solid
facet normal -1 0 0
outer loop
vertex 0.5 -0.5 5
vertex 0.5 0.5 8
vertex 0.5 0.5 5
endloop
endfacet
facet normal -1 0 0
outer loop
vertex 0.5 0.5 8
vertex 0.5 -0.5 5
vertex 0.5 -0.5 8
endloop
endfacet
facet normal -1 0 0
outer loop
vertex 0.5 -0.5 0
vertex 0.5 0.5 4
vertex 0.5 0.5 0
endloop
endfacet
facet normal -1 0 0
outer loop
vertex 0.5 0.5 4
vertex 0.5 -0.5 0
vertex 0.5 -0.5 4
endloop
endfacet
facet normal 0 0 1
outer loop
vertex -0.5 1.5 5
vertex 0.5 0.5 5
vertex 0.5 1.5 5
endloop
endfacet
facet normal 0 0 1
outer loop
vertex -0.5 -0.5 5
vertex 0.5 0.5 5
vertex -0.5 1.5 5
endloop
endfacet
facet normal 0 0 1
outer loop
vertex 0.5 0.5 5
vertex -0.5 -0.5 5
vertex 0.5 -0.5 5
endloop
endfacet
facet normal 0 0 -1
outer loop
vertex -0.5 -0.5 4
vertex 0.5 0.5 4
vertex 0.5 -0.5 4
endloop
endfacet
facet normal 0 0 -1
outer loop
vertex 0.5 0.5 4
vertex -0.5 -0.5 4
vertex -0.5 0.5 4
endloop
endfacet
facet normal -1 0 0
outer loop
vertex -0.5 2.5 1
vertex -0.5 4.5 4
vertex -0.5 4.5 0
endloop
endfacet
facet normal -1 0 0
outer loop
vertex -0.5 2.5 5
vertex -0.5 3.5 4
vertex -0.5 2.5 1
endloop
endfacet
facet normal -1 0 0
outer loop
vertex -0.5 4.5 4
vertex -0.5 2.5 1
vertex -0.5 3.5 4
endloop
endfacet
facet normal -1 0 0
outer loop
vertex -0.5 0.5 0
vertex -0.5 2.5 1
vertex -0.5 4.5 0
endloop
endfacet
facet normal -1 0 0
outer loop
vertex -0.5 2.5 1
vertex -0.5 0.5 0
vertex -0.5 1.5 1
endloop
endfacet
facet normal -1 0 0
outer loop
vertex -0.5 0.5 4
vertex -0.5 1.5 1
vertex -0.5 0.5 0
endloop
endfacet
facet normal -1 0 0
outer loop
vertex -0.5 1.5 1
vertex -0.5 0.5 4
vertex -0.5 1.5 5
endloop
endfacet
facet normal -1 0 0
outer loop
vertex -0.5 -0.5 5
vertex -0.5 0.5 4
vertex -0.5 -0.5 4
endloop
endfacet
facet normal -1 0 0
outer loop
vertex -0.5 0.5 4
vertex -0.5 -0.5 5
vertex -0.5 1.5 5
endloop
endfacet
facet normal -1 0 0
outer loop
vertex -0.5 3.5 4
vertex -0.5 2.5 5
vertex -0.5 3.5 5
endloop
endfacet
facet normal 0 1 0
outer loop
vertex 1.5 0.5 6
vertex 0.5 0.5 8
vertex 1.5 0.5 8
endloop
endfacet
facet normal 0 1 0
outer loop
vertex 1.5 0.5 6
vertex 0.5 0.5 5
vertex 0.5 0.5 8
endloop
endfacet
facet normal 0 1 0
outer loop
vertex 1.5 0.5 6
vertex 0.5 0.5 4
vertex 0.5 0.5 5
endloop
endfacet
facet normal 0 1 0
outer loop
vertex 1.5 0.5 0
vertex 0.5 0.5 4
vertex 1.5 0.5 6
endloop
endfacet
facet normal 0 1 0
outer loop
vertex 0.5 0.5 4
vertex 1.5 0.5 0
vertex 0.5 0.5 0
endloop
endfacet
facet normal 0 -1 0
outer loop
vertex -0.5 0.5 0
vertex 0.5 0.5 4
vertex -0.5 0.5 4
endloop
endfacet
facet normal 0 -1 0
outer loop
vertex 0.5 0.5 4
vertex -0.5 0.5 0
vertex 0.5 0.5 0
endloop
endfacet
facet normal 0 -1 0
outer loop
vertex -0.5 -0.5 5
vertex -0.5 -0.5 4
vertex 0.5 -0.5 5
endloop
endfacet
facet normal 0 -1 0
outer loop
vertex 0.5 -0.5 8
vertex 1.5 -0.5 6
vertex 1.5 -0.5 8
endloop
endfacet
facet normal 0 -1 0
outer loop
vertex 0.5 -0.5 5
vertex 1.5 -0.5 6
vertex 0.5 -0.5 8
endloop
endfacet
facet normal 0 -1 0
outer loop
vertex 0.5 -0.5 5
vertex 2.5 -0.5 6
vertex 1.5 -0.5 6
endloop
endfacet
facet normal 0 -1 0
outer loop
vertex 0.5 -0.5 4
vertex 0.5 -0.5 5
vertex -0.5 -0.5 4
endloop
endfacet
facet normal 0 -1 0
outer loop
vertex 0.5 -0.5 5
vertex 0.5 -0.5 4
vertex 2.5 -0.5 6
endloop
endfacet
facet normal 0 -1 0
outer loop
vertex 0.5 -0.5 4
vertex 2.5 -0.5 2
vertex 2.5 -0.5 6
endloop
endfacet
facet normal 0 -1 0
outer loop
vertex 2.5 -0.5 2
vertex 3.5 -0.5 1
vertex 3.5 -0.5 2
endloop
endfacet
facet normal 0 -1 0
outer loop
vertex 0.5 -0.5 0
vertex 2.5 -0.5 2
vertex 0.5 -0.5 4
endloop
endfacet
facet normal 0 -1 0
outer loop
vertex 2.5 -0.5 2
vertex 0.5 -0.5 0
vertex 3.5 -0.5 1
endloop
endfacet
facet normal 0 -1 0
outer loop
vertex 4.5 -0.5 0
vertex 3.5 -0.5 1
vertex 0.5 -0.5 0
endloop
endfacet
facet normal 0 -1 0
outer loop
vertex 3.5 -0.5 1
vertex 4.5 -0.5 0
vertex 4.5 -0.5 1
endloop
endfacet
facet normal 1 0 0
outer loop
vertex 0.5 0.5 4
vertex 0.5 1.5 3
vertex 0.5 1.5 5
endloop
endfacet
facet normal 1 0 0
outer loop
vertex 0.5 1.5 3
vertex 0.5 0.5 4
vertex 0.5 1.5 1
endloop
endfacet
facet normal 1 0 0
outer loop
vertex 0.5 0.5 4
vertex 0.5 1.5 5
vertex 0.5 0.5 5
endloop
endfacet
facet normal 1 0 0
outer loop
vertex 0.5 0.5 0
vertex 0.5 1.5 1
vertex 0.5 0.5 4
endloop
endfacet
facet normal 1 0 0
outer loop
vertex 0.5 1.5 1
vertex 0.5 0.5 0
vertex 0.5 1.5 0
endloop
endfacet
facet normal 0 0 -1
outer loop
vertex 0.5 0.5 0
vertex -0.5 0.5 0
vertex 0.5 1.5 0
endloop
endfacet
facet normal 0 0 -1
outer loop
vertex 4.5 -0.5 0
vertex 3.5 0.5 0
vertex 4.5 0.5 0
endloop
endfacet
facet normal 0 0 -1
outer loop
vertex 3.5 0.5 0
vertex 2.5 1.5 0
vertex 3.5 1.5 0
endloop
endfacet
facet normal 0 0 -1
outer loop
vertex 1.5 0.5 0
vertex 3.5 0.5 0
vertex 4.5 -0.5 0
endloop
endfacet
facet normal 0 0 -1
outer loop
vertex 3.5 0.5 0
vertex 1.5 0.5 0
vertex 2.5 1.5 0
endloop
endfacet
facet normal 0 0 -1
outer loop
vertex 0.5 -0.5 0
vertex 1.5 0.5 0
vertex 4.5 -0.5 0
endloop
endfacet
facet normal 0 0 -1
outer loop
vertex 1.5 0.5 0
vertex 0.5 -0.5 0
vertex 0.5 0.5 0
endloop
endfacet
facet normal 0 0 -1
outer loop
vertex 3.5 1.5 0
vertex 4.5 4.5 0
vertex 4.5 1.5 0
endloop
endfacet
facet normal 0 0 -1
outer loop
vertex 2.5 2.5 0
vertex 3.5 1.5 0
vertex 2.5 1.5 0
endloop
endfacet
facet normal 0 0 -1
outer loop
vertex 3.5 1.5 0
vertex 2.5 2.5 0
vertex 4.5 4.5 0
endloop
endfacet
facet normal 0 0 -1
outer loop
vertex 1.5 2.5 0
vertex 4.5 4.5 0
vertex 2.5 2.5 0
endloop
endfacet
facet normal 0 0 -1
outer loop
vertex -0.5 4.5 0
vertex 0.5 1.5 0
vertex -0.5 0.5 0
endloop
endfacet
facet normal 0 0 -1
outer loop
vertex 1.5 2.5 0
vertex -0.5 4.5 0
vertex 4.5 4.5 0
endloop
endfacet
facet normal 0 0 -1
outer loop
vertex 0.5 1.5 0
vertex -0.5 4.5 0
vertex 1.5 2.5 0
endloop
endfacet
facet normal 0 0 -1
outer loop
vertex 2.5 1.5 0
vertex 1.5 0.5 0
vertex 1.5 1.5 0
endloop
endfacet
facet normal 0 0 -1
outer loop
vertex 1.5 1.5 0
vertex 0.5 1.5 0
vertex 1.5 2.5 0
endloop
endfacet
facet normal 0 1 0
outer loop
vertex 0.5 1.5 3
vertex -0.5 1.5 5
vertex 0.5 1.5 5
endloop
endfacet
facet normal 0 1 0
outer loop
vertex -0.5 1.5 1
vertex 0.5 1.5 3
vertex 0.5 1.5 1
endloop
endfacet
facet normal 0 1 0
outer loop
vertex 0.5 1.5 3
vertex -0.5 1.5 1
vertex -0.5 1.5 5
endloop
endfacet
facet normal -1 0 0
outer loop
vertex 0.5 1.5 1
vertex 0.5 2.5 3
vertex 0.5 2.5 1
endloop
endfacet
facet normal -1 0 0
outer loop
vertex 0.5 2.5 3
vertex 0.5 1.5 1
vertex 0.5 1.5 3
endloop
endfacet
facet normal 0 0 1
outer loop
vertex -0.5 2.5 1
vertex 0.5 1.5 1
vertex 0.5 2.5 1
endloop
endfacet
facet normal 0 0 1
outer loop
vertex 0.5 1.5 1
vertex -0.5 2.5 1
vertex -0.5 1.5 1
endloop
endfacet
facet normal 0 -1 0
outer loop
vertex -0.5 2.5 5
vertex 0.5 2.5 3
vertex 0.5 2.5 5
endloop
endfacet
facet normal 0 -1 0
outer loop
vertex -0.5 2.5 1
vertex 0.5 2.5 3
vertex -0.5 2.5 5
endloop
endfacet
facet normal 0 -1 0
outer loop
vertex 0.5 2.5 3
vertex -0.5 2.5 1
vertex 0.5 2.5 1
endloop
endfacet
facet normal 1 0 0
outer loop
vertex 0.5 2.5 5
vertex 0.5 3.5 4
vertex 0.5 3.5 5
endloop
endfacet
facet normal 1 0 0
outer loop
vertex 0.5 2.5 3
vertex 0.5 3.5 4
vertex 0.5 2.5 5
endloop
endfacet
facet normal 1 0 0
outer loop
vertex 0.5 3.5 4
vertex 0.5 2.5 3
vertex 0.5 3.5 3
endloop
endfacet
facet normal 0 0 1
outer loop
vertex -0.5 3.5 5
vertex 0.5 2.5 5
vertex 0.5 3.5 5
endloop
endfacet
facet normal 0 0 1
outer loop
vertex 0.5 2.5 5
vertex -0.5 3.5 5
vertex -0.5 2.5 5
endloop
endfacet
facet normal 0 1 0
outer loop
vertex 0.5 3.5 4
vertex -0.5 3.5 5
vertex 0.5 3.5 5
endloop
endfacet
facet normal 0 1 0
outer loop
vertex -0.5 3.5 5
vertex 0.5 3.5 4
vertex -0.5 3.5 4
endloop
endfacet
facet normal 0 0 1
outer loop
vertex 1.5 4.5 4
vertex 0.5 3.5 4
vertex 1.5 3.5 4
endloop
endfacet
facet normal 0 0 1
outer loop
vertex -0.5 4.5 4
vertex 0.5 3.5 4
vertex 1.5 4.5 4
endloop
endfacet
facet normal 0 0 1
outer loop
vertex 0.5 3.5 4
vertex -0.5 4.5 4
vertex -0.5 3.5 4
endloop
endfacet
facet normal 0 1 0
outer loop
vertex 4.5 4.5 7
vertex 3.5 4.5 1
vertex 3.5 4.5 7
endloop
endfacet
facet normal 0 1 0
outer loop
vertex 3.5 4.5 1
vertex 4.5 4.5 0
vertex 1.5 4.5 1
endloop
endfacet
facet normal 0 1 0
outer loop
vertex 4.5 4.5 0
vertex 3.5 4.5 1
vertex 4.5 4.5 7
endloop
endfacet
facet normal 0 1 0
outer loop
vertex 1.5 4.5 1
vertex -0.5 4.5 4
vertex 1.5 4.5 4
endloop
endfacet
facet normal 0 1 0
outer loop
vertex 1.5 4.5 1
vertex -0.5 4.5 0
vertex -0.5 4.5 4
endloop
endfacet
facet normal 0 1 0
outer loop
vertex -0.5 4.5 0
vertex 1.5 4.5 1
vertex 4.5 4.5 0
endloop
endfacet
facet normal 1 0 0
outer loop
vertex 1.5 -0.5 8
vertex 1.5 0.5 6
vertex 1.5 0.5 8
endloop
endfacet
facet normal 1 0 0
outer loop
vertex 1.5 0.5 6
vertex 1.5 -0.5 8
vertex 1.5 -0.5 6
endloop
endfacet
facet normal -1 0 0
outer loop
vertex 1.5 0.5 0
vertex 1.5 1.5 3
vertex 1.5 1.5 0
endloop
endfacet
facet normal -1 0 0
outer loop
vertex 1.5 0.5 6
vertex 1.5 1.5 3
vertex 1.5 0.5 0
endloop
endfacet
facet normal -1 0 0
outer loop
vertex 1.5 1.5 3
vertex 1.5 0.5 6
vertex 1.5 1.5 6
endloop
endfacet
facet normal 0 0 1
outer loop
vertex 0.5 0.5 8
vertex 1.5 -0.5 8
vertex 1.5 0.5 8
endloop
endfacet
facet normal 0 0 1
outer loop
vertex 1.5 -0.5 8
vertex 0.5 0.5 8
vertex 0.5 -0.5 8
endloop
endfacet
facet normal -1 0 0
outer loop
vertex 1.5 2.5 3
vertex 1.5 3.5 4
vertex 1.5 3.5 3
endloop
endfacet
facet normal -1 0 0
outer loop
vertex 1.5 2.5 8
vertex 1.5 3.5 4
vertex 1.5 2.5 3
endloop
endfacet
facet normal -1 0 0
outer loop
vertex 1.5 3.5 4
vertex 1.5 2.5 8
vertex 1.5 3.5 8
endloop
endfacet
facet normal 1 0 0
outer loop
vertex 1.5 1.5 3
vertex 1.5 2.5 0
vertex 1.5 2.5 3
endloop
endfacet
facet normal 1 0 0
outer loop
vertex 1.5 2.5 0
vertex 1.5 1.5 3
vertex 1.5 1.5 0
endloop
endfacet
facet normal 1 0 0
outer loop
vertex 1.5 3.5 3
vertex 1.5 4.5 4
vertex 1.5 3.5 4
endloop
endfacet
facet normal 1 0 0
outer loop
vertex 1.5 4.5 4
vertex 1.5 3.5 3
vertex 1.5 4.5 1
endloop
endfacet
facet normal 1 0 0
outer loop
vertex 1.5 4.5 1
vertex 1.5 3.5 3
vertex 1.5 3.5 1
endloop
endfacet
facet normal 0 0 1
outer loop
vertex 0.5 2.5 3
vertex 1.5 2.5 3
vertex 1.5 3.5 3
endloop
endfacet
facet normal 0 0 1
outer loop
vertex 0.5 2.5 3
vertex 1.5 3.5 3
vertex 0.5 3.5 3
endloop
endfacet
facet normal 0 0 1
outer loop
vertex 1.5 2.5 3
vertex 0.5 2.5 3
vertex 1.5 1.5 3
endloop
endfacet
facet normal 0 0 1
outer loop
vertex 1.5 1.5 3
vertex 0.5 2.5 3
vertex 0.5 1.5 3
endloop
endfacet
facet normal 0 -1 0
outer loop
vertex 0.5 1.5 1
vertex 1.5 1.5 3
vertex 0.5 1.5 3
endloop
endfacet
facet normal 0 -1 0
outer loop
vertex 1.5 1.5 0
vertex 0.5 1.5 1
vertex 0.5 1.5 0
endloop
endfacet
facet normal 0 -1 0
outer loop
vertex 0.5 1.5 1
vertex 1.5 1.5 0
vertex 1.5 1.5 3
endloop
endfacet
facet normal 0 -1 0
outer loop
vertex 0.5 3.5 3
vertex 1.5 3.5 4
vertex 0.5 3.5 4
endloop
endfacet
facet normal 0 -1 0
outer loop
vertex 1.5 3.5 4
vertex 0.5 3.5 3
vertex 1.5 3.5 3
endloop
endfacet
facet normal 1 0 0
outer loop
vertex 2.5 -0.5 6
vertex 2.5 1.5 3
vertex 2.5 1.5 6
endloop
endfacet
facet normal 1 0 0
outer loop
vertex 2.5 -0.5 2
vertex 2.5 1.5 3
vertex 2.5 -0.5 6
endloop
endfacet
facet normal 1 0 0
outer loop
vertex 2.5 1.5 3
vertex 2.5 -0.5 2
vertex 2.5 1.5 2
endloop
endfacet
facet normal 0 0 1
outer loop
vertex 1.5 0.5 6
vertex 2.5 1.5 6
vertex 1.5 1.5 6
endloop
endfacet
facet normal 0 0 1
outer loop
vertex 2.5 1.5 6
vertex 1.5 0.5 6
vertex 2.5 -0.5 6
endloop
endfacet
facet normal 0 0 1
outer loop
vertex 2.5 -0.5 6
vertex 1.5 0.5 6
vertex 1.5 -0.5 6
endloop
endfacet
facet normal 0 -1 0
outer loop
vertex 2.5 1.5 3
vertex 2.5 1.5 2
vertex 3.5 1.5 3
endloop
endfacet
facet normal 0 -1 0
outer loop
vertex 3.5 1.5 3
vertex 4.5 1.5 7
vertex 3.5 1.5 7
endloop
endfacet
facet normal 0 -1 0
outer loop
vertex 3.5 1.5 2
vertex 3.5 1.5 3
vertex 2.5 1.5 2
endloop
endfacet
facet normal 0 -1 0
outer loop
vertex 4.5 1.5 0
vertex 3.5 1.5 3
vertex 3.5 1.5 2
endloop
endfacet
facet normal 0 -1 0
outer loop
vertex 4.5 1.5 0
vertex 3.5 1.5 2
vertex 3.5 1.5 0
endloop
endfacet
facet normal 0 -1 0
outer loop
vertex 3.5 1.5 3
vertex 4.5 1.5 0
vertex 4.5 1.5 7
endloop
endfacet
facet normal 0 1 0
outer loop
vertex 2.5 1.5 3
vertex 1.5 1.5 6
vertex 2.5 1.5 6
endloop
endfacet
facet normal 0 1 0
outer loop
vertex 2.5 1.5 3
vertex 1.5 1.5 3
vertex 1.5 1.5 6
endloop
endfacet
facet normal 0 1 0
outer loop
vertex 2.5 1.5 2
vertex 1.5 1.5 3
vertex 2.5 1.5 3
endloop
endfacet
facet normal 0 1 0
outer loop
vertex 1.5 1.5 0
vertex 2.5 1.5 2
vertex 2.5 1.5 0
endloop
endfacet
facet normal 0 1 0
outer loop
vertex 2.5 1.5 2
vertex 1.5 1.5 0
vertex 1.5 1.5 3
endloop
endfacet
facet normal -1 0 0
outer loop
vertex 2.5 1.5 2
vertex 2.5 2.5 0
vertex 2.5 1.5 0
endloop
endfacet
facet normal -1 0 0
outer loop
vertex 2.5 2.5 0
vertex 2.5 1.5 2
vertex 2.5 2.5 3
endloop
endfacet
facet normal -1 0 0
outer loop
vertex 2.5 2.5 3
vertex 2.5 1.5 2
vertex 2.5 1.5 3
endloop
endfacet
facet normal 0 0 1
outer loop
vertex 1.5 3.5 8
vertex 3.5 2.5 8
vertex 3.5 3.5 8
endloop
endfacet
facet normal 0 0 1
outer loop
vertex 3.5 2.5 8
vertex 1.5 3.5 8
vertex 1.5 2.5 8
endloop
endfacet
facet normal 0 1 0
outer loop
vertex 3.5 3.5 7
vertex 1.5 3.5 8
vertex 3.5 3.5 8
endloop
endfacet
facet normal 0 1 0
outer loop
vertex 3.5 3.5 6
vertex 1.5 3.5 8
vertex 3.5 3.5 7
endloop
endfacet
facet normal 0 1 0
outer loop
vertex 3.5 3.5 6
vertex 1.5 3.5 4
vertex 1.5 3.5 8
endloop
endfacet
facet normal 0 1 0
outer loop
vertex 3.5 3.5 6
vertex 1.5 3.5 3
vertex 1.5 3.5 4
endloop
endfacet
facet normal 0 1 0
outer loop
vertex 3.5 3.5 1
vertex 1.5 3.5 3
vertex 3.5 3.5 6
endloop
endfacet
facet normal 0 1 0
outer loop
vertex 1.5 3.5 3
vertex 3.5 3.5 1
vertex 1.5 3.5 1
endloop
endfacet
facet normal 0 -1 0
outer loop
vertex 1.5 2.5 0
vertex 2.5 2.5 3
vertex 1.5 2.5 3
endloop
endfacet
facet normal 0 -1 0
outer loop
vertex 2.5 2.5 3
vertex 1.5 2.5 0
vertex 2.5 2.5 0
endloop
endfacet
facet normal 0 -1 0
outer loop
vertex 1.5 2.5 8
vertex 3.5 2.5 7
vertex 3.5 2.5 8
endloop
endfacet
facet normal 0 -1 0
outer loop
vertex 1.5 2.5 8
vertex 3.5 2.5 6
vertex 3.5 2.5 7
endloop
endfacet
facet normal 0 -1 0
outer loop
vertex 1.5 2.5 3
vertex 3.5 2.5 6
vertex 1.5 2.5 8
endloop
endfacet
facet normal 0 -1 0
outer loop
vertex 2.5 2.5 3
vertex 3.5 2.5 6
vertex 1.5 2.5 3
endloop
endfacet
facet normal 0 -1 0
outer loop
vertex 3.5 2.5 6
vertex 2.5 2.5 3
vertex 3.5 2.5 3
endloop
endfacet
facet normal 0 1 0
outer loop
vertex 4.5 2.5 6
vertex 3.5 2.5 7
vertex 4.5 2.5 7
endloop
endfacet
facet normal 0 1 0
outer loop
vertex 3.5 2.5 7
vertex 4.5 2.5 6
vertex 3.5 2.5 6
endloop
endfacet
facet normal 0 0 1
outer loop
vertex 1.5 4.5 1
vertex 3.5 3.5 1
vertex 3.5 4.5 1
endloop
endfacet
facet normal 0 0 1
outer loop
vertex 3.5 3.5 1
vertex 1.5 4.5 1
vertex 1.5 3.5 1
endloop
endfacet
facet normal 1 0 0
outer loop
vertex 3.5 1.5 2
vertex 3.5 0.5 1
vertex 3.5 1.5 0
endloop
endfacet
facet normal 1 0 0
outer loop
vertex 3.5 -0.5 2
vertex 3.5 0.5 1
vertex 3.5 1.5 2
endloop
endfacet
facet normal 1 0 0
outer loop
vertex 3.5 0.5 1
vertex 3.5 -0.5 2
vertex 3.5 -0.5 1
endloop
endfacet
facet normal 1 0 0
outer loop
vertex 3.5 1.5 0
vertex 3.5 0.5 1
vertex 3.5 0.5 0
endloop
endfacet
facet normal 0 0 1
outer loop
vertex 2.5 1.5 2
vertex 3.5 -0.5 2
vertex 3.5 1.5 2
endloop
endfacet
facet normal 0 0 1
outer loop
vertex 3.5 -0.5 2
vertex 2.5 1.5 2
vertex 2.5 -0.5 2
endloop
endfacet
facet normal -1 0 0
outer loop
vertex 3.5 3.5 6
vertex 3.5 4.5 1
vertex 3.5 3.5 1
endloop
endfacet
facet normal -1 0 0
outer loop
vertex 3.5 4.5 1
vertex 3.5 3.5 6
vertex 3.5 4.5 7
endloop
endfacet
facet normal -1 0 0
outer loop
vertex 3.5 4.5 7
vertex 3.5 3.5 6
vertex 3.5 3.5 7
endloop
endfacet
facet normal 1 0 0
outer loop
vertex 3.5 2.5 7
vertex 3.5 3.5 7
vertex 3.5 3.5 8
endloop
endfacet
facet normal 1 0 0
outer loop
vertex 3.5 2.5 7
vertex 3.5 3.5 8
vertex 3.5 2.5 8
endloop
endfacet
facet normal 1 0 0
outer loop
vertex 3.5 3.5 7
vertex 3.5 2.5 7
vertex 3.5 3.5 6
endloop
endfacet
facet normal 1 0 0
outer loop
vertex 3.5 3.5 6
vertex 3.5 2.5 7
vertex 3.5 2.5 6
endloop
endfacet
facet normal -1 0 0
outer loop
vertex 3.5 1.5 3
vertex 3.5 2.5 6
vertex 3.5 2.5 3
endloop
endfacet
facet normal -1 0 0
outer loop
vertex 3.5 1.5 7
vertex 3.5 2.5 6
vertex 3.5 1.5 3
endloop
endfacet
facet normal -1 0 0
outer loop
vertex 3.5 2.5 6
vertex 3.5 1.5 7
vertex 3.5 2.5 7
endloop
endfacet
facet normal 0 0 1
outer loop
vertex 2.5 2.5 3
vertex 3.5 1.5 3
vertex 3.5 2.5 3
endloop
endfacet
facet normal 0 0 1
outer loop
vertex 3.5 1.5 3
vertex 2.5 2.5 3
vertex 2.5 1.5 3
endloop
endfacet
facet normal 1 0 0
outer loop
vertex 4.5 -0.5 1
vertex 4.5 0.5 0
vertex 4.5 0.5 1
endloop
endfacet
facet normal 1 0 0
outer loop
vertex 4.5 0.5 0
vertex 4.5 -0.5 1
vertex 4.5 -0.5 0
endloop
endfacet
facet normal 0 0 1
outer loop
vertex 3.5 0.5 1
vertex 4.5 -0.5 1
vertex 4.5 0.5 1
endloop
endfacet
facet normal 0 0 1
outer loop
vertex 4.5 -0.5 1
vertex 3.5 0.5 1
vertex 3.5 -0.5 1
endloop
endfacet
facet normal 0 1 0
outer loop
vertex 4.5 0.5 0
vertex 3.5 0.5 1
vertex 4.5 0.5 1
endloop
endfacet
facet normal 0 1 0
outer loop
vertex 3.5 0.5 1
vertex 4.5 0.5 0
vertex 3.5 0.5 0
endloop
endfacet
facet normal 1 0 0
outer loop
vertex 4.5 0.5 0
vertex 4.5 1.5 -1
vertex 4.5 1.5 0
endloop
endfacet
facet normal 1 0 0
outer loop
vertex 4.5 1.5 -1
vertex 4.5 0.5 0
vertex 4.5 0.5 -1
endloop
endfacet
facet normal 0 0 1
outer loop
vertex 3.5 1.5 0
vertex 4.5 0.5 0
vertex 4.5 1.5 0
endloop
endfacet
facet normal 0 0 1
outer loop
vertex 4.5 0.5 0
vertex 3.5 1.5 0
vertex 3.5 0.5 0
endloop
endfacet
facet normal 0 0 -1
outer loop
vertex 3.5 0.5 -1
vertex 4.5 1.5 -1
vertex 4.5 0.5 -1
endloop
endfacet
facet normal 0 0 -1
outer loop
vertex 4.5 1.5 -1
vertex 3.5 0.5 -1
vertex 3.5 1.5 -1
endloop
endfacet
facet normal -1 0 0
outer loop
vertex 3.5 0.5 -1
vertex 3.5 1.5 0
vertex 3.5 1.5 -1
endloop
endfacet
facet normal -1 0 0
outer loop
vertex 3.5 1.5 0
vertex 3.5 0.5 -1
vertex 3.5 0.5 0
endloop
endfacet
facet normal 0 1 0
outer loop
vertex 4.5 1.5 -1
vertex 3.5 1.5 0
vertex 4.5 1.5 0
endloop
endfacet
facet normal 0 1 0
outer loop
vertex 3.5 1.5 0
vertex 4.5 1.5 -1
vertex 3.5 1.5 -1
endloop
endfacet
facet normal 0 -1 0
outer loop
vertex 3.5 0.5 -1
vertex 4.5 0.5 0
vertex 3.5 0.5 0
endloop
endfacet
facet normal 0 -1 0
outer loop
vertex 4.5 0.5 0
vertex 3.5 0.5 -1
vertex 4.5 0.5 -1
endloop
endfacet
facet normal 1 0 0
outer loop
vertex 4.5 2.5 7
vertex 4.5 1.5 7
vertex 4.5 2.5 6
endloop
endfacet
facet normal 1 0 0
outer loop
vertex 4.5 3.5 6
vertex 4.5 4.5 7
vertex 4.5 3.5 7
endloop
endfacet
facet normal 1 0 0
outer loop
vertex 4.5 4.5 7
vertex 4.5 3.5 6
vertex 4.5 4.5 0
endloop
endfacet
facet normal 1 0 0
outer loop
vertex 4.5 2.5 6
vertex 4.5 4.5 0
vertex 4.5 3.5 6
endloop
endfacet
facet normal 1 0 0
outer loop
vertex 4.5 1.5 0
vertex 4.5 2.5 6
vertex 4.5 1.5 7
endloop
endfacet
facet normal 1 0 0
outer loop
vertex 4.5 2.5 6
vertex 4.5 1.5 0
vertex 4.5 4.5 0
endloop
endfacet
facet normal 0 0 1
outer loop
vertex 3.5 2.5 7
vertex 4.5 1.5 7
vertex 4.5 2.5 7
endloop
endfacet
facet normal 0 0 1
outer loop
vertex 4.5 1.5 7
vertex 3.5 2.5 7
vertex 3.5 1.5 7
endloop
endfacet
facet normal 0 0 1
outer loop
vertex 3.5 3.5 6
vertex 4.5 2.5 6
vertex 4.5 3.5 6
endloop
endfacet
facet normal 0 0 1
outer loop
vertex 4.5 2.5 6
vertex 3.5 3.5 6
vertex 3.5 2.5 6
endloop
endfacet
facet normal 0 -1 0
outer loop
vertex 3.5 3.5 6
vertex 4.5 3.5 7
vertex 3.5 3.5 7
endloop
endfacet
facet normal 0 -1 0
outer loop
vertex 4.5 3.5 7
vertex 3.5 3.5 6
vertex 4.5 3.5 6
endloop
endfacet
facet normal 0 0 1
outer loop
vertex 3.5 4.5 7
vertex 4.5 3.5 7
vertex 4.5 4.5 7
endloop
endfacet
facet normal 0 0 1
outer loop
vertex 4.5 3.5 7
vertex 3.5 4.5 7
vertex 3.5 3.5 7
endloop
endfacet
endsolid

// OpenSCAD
union() {
    translate([0, 0, 4.5]) color([1, 0, 0]) cube([1, 1, 1], center=true);
    translate([0, 1, 2.5]) cube([1, 1, 5], center=true);
    translate([0, 2, 0.5]) cube([1, 1, 1], center=true);
    translate([0, 3, 2.5]) cube([1, 1, 5], center=true);
    translate([0, 4, 2.0]) cube([1, 1, 4], center=true);
    translate([1, 0, 4.0]) cube([1, 1, 8], center=true);
    translate([1, 2, 1.5]) cube([1, 1, 3], center=true);
    translate([1, 3, 1.5]) cube([1, 1, 3], center=true);
    translate([1, 4, 2.0]) cube([1, 1, 4], center=true);
    translate([2, 0, 3.0]) cube([1, 1, 6], center=true);
    translate([2, 1, 3.0]) cube([1, 1, 6], center=true);
    translate([2, 3, 4.0]) cube([1, 1, 8], center=true);
    translate([2, 4, 0.5]) cube([1, 1, 1], center=true);
    translate([3, 0, 1.0]) cube([1, 1, 2], center=true);
    translate([3, 1, 1.0]) cube([1, 1, 2], center=true);
    translate([3, 2, 1.5]) cube([1, 1, 3], center=true);
    translate([3, 3, 4.0]) cube([1, 1, 8], center=true);
    translate([3, 4, 0.5]) cube([1, 1, 1], center=true);
    translate([4, 0, 0.5]) cube([1, 1, 1], center=true);
    translate([4, 1, -0.5]) color([0, 0, 1]) cube([1, 1, 1], center=true);
    translate([4, 2, 3.5]) cube([1, 1, 7], center=true);
    translate([4, 3, 3.0]) cube([1, 1, 6], center=true);
    translate([4, 4, 3.5]) cube([1, 1, 7], center=true);
}
